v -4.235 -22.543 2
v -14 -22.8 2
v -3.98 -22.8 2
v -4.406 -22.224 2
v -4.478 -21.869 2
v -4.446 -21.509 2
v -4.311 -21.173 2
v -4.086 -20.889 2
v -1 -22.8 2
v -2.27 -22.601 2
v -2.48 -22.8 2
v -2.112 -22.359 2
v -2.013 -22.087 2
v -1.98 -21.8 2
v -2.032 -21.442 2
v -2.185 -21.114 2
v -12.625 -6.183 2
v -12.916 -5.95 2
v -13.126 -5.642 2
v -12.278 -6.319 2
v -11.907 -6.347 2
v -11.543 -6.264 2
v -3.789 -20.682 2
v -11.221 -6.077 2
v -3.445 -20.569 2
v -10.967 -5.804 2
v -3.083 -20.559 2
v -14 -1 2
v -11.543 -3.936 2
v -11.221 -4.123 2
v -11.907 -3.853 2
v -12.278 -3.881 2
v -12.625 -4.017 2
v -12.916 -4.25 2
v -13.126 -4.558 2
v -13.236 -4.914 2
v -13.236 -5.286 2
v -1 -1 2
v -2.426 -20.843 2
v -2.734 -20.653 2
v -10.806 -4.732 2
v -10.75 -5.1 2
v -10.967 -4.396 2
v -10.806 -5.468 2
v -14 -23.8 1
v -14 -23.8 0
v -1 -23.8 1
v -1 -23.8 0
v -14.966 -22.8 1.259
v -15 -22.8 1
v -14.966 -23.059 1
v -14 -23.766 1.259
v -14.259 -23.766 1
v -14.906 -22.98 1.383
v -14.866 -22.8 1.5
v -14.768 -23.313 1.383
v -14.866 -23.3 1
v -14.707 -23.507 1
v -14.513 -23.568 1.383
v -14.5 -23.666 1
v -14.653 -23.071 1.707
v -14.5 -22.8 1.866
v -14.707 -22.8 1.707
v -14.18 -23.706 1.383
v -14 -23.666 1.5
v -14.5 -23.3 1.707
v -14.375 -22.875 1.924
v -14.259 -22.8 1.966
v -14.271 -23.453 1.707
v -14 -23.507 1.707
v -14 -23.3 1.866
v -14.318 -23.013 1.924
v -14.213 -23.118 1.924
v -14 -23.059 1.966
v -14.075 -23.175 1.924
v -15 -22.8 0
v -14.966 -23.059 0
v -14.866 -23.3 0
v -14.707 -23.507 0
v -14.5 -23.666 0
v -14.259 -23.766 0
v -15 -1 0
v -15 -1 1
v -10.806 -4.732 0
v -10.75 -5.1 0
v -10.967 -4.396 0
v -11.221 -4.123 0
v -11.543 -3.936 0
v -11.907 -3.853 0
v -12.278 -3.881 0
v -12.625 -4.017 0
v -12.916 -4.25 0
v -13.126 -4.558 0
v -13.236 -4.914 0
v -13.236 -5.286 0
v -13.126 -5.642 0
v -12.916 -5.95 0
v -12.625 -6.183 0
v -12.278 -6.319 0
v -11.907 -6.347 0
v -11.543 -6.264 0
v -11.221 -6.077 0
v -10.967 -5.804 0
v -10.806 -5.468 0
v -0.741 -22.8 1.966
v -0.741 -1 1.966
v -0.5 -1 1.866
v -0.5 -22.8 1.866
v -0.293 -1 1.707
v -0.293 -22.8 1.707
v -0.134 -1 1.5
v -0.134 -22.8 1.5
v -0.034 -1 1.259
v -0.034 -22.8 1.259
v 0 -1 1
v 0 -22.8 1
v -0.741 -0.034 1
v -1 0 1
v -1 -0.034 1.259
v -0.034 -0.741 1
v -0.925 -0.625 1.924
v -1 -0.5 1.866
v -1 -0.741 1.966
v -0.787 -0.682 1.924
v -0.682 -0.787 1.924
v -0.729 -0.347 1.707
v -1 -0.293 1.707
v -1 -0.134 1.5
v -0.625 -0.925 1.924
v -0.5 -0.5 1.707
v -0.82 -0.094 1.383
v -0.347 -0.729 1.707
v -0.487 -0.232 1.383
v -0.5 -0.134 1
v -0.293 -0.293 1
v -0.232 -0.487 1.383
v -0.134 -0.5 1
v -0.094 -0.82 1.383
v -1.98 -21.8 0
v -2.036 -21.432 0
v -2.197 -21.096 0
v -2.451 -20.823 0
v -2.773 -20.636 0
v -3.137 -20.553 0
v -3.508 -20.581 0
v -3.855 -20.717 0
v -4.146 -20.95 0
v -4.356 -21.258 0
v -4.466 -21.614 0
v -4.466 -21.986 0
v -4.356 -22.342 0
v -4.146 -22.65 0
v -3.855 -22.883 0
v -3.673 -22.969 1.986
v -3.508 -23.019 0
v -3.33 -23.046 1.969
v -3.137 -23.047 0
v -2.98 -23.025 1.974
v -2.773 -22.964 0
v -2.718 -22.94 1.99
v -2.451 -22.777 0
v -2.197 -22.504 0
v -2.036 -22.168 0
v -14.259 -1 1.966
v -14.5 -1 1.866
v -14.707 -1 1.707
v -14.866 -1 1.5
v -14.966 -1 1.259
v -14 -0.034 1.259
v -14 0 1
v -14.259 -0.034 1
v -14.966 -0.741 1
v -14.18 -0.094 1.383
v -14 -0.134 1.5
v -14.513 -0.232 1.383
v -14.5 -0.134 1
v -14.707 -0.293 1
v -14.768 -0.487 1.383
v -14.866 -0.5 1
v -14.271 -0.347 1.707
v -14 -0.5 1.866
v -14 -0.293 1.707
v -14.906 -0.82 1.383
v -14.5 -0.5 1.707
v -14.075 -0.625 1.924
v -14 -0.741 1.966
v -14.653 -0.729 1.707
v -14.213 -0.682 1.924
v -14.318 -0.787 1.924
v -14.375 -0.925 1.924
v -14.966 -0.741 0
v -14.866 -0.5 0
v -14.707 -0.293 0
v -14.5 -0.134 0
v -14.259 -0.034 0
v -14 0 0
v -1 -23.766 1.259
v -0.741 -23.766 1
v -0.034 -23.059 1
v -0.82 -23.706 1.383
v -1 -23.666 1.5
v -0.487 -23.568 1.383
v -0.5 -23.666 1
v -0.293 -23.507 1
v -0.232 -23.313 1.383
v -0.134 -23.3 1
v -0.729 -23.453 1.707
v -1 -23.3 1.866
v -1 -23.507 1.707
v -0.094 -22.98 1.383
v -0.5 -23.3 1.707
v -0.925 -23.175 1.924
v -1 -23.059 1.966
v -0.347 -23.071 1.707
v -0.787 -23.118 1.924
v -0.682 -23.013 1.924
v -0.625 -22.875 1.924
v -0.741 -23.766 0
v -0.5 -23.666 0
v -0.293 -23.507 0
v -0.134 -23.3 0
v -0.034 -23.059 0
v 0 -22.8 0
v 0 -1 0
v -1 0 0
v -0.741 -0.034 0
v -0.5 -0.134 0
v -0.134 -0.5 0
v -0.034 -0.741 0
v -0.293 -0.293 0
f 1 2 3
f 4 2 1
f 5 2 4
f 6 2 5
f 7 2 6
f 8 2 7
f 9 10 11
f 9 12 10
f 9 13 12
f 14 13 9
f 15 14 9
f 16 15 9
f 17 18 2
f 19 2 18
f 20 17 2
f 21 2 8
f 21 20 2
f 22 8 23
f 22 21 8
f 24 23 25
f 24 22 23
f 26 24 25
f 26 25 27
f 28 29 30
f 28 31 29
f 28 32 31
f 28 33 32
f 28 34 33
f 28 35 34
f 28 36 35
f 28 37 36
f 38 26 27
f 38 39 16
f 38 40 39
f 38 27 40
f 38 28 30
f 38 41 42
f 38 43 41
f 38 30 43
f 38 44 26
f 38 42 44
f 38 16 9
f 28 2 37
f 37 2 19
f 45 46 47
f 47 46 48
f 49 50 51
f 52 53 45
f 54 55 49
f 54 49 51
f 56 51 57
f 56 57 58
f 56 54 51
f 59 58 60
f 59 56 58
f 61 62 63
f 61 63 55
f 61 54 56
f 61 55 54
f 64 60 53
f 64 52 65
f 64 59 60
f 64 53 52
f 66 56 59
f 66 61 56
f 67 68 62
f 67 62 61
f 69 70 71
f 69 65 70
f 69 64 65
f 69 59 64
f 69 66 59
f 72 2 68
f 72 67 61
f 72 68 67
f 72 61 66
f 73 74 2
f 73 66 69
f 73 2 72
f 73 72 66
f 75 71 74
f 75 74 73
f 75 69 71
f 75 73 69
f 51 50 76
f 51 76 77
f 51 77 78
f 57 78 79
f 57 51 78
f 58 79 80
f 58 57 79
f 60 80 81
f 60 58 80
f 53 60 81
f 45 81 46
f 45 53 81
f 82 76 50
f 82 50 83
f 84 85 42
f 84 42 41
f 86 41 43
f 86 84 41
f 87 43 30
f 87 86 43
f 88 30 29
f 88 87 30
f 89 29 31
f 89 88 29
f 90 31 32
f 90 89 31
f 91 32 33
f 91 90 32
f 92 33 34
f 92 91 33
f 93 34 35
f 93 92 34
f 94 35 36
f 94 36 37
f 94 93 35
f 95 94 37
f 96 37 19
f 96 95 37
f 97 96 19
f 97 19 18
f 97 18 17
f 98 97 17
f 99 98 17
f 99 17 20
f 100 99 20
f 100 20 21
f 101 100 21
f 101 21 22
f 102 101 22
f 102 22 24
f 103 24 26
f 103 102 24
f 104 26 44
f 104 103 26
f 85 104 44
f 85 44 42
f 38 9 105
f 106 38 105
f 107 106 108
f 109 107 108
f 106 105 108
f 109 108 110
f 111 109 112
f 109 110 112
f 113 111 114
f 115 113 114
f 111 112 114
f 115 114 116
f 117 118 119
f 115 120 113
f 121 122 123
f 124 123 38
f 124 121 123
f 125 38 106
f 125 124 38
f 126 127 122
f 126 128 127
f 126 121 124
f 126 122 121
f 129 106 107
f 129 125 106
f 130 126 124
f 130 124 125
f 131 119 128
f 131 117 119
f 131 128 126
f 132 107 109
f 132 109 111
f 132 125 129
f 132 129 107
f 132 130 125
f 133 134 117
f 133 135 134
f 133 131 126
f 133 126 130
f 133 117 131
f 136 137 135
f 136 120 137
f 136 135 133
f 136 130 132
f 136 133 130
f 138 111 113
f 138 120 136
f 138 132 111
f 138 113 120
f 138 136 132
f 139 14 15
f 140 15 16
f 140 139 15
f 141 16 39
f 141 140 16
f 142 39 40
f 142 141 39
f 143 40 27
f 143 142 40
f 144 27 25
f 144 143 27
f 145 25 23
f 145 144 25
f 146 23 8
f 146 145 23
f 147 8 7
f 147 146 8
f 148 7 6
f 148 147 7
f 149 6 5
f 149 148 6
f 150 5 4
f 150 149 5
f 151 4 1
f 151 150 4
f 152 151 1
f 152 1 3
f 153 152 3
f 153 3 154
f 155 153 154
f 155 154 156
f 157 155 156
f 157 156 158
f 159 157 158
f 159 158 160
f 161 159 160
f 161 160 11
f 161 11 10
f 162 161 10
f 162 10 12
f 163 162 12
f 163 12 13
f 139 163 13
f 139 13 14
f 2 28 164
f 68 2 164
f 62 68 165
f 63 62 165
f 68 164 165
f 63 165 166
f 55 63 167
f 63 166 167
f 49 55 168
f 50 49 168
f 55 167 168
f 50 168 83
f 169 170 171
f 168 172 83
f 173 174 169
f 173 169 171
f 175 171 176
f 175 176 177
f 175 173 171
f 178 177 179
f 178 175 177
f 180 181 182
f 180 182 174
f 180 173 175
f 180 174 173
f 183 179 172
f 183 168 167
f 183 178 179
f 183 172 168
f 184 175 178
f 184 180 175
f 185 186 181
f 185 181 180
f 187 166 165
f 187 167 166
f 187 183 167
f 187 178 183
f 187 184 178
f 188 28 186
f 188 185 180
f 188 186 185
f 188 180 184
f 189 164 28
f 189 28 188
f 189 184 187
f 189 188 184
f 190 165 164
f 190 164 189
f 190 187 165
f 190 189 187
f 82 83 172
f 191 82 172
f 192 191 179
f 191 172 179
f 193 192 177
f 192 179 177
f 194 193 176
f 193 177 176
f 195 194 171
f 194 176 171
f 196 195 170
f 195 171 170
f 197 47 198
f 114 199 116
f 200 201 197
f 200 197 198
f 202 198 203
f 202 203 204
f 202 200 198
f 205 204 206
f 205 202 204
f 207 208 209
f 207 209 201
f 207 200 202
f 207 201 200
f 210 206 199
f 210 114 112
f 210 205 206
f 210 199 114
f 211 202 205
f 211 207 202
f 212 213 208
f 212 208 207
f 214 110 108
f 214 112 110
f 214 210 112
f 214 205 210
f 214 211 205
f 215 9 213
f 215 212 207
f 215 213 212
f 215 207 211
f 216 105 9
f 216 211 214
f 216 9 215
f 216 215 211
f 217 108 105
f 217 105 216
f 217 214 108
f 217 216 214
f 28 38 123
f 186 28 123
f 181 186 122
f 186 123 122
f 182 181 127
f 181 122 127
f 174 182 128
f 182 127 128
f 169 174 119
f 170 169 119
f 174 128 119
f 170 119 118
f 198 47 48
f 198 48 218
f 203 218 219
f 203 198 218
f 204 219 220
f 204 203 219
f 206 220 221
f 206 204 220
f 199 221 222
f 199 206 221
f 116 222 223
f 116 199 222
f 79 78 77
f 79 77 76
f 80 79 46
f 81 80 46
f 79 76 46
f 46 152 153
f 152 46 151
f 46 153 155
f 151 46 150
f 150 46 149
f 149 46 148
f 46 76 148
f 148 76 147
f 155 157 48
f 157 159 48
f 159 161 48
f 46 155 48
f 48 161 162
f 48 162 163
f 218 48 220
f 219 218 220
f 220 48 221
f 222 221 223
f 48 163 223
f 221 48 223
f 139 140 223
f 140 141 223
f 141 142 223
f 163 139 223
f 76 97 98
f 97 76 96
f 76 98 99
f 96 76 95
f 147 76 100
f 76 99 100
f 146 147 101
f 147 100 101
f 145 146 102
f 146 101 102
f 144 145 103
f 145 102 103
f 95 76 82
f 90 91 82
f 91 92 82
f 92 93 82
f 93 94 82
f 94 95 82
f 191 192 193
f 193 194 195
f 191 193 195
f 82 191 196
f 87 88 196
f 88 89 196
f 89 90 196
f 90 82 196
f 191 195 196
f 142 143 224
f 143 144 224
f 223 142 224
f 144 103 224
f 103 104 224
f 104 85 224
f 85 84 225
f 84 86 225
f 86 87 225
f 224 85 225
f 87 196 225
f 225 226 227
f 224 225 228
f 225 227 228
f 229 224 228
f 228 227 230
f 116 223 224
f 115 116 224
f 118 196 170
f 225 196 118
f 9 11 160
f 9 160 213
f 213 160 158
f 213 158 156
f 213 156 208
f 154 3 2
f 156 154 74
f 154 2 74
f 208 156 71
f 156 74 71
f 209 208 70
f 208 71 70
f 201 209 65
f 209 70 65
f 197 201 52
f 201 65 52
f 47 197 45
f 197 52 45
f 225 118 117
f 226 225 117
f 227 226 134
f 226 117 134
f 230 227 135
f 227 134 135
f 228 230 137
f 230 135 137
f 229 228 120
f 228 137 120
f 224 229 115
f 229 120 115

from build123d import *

# Parameters (mm, degrees)
SCHIZZO1_W                   = 15
SCHIZZO1_H                   = 23.8
SCHIZZO1_R                   = 1.25
ESTRUSIONE_ESTRUSIONE1_DEPTH = 2
RACCORDO1_R                  = 1
RACCORDO2_R                  = 1


with BuildPart() as part:
    # Schizzo1 → Estrusione-Estrusione1 (new body)
    with BuildSketch(Plane.XY):
        with Locations((-7.5, -11.9)):
            Rectangle(SCHIZZO1_W, SCHIZZO1_H)
        with Locations((-12, -5.1)):
            Circle(SCHIZZO1_R, mode=Mode.SUBTRACT)
        with Locations((-3.23, -21.8)):
            Circle(SCHIZZO1_R, mode=Mode.SUBTRACT)
    extrude(amount=ESTRUSIONE_ESTRUSIONE1_DEPTH)

    # Raccordo1
    raccordo1_edges = [part.edges().sort_by_distance(p)[0] for p in [
        (0, -23.8, 1),
        (-15, -23.8, 1),
        (-15, 0, 1),
        (0, 0, 1),
    ]]
    fillet(raccordo1_edges, radius=RACCORDO1_R)

    # Raccordo2
    # the kernel refuses this fillet: 1 mm, written as the material it takes off along each edge
    with BuildSketch(Plane(origin=(0, -22.8, 2), x_dir=(-1, 0, 0), z_dir=(0, 1, 0)), Plane(origin=(-15, -1, 2), x_dir=(1, 0, 0), z_dir=(0, -1, 0))) as raccordo2_piece_1:
        with BuildLine():
            CenterArc((RACCORDO2_R, -RACCORDO2_R), RACCORDO2_R, 90, 90)
            Line((0, -RACCORDO2_R), (0, 0))
            Line((0, 0), (RACCORDO2_R, 0))
        make_face()
    extrude(amount=21.8, mode=Mode.SUBTRACT)
    with BuildSketch(Plane(origin=(-14, -23.8, 2), x_dir=(0, 1, 0), z_dir=(1, 0, 0))) as raccordo2_piece_2:
        with BuildLine():
            CenterArc((RACCORDO2_R, -RACCORDO2_R), RACCORDO2_R, 90, 90)
            Line((0, -RACCORDO2_R), (0, 0))
            Line((0, 0), (RACCORDO2_R, 0))
        make_face()
    extrude(amount=13, mode=Mode.SUBTRACT)
    with BuildSketch(Plane(origin=(-1, 0, 2), x_dir=(0, 0, -1), z_dir=(-1, 0, 0))) as raccordo2_piece_3:
        with BuildLine():
            CenterArc((RACCORDO2_R, RACCORDO2_R), RACCORDO2_R, 180, 90)
            Line((0, RACCORDO2_R), (0, 0))
            Line((0, 0), (RACCORDO2_R, 0))
        make_face()
    extrude(amount=13, mode=Mode.SUBTRACT)
    with BuildSketch(Plane(origin=(-14, -22.8, 2), x_dir=(-1, 0, 0), z_dir=(0, 1, 0))) as raccordo2_piece_4:
        with BuildLine():
            CenterArc((1 - RACCORDO2_R, -RACCORDO2_R), RACCORDO2_R, 0, 90)
            Line((1, -RACCORDO2_R), (1, 0))
            Line((1, 0), (1 - RACCORDO2_R, 0))
        make_face()
    revolve(axis=Axis((-14, -22.8, 2), (0, 0, 1)), revolution_arc=90, mode=Mode.SUBTRACT)
    with BuildSketch(Plane(origin=(-14, -1, 2), x_dir=(0, 1, 0), z_dir=(1, 0, 0))) as raccordo2_piece_5:
        with BuildLine():
            CenterArc((1 - RACCORDO2_R, -RACCORDO2_R), RACCORDO2_R, 0, 90)
            Line((1 - RACCORDO2_R, 0), (1, 0))
            Line((1, 0), (1, -RACCORDO2_R))
        make_face()
    revolve(axis=Axis((-14, -1, 2), (0, 0, 1)), revolution_arc=90, mode=Mode.SUBTRACT)
    with BuildSketch(Plane(origin=(-1, -1, 2), x_dir=(0, 1, 0), z_dir=(-1, 0, 0))) as raccordo2_piece_6:
        with BuildLine():
            CenterArc((1 - RACCORDO2_R, RACCORDO2_R), RACCORDO2_R, 270, 90)
            Line((1 - RACCORDO2_R, 0), (1, 0))
            Line((1, 0), (1, RACCORDO2_R))
        make_face()
    revolve(axis=Axis((-1, -1, 2), (0, 0, -1)), revolution_arc=90, mode=Mode.SUBTRACT)
    with BuildSketch(Plane(origin=(-1, -22.8, 2), x_dir=(0, -1, 0), z_dir=(-1, 0, 0))) as raccordo2_piece_7:
        with BuildLine():
            CenterArc((1 - RACCORDO2_R, -RACCORDO2_R), RACCORDO2_R, 0, 90)
            Line((1, -RACCORDO2_R), (1, 0))
            Line((1, 0), (1 - RACCORDO2_R, 0))
        make_face()
    revolve(axis=Axis((-1, -22.8, 2), (0, 0, 1)), revolution_arc=90, mode=Mode.SUBTRACT)


solid = part.part
